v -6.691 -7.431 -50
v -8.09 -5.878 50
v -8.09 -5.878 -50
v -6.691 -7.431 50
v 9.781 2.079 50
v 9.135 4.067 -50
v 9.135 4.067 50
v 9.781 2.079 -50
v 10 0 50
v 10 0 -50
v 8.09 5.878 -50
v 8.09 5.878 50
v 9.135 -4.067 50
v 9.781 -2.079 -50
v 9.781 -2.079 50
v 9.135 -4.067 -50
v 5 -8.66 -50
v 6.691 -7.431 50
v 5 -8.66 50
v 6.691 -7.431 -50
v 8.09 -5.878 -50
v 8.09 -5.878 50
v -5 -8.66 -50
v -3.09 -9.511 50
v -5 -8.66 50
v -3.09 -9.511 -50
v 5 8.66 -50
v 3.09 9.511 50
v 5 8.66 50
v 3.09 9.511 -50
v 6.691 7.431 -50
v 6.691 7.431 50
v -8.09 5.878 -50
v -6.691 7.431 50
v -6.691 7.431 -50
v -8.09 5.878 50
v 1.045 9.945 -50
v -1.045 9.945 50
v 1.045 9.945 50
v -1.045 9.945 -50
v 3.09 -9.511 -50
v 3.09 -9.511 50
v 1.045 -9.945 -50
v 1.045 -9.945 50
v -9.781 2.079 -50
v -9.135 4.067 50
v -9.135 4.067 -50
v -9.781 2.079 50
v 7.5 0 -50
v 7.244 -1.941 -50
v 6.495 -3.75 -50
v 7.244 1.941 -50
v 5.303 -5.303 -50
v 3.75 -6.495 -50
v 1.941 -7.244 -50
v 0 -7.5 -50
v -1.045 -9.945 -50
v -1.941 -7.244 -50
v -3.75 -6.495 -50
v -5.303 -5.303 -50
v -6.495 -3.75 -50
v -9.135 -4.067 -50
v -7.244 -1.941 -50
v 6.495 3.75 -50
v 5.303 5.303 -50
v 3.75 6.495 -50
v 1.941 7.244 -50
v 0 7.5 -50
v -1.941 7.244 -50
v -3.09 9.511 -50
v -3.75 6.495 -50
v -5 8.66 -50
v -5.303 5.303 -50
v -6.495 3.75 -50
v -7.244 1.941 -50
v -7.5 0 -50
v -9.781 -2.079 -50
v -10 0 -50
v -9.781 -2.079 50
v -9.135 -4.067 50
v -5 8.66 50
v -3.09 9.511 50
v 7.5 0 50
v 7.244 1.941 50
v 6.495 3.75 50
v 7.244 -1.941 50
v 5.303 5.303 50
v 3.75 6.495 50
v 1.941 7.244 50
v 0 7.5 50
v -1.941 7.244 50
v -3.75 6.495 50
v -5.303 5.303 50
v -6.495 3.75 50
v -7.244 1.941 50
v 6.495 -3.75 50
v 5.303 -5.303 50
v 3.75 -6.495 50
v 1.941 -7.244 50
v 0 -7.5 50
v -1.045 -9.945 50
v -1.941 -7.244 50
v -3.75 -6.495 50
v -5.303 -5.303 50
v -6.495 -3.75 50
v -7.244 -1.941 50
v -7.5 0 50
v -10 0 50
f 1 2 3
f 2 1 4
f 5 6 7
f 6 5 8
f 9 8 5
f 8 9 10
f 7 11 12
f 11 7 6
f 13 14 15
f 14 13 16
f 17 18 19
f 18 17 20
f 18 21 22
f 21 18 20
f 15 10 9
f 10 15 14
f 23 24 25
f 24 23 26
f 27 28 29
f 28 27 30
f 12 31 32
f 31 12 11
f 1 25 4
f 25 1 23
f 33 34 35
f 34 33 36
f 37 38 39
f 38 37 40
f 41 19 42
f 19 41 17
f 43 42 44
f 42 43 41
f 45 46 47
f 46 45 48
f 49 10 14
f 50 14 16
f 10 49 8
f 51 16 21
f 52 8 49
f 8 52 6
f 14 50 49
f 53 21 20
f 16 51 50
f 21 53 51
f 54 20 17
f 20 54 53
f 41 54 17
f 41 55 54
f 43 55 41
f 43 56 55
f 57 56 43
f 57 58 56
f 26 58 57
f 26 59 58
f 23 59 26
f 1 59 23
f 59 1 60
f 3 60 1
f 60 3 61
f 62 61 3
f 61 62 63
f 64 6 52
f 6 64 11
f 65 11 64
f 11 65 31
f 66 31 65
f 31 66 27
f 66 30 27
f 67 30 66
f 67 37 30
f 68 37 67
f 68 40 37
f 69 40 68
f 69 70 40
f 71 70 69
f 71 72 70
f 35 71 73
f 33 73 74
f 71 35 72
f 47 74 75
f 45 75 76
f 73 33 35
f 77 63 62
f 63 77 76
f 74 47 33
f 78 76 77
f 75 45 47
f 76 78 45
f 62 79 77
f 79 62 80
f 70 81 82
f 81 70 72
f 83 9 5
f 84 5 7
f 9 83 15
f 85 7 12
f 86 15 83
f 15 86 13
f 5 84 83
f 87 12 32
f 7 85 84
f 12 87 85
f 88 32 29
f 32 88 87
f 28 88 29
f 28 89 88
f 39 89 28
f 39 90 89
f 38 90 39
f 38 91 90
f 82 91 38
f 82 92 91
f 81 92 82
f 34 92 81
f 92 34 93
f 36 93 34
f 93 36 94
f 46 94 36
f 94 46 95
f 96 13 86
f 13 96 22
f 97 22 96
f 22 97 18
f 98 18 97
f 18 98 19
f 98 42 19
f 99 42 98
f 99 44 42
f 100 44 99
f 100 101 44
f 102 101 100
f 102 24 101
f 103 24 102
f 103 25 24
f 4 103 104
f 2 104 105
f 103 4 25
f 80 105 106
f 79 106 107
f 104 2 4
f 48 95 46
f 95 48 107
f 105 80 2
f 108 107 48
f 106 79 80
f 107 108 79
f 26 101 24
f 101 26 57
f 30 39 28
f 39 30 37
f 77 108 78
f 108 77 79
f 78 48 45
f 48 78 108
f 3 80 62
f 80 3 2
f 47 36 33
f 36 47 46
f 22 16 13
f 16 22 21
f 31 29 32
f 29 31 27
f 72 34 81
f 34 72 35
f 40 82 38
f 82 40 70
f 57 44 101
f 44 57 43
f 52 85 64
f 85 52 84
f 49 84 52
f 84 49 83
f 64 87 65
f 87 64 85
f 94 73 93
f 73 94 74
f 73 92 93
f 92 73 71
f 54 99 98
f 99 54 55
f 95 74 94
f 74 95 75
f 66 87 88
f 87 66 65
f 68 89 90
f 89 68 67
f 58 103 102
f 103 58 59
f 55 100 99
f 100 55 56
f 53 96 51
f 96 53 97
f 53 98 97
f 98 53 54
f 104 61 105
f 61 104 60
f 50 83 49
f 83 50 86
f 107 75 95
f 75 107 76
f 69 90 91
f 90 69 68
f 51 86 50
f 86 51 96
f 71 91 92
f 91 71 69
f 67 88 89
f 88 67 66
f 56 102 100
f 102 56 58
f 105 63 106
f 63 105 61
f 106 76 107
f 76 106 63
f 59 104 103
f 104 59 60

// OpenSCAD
// Parameters for the PVC aquarium tubing
outer_diameter = 20; // Outer diameter of the tube
inner_diameter = 15; // Inner diameter of the tube
length = 100;        // Length of the tube
centered = true;     // Center the tube on the origin

// Function to create the tubing body
module tubing_body() {
    cylinder(d=outer_diameter, h=length, center=centered);
}

// Function to create the hollow bore
module hollow_bore() {
    cylinder(d=inner_diameter, h=length, center=centered);
}

// Function to create the complete tubing
module tubing() {
    difference() {
        tubing_body();
        hollow_bore();
    }
}

// Render the tubing
tubing();
